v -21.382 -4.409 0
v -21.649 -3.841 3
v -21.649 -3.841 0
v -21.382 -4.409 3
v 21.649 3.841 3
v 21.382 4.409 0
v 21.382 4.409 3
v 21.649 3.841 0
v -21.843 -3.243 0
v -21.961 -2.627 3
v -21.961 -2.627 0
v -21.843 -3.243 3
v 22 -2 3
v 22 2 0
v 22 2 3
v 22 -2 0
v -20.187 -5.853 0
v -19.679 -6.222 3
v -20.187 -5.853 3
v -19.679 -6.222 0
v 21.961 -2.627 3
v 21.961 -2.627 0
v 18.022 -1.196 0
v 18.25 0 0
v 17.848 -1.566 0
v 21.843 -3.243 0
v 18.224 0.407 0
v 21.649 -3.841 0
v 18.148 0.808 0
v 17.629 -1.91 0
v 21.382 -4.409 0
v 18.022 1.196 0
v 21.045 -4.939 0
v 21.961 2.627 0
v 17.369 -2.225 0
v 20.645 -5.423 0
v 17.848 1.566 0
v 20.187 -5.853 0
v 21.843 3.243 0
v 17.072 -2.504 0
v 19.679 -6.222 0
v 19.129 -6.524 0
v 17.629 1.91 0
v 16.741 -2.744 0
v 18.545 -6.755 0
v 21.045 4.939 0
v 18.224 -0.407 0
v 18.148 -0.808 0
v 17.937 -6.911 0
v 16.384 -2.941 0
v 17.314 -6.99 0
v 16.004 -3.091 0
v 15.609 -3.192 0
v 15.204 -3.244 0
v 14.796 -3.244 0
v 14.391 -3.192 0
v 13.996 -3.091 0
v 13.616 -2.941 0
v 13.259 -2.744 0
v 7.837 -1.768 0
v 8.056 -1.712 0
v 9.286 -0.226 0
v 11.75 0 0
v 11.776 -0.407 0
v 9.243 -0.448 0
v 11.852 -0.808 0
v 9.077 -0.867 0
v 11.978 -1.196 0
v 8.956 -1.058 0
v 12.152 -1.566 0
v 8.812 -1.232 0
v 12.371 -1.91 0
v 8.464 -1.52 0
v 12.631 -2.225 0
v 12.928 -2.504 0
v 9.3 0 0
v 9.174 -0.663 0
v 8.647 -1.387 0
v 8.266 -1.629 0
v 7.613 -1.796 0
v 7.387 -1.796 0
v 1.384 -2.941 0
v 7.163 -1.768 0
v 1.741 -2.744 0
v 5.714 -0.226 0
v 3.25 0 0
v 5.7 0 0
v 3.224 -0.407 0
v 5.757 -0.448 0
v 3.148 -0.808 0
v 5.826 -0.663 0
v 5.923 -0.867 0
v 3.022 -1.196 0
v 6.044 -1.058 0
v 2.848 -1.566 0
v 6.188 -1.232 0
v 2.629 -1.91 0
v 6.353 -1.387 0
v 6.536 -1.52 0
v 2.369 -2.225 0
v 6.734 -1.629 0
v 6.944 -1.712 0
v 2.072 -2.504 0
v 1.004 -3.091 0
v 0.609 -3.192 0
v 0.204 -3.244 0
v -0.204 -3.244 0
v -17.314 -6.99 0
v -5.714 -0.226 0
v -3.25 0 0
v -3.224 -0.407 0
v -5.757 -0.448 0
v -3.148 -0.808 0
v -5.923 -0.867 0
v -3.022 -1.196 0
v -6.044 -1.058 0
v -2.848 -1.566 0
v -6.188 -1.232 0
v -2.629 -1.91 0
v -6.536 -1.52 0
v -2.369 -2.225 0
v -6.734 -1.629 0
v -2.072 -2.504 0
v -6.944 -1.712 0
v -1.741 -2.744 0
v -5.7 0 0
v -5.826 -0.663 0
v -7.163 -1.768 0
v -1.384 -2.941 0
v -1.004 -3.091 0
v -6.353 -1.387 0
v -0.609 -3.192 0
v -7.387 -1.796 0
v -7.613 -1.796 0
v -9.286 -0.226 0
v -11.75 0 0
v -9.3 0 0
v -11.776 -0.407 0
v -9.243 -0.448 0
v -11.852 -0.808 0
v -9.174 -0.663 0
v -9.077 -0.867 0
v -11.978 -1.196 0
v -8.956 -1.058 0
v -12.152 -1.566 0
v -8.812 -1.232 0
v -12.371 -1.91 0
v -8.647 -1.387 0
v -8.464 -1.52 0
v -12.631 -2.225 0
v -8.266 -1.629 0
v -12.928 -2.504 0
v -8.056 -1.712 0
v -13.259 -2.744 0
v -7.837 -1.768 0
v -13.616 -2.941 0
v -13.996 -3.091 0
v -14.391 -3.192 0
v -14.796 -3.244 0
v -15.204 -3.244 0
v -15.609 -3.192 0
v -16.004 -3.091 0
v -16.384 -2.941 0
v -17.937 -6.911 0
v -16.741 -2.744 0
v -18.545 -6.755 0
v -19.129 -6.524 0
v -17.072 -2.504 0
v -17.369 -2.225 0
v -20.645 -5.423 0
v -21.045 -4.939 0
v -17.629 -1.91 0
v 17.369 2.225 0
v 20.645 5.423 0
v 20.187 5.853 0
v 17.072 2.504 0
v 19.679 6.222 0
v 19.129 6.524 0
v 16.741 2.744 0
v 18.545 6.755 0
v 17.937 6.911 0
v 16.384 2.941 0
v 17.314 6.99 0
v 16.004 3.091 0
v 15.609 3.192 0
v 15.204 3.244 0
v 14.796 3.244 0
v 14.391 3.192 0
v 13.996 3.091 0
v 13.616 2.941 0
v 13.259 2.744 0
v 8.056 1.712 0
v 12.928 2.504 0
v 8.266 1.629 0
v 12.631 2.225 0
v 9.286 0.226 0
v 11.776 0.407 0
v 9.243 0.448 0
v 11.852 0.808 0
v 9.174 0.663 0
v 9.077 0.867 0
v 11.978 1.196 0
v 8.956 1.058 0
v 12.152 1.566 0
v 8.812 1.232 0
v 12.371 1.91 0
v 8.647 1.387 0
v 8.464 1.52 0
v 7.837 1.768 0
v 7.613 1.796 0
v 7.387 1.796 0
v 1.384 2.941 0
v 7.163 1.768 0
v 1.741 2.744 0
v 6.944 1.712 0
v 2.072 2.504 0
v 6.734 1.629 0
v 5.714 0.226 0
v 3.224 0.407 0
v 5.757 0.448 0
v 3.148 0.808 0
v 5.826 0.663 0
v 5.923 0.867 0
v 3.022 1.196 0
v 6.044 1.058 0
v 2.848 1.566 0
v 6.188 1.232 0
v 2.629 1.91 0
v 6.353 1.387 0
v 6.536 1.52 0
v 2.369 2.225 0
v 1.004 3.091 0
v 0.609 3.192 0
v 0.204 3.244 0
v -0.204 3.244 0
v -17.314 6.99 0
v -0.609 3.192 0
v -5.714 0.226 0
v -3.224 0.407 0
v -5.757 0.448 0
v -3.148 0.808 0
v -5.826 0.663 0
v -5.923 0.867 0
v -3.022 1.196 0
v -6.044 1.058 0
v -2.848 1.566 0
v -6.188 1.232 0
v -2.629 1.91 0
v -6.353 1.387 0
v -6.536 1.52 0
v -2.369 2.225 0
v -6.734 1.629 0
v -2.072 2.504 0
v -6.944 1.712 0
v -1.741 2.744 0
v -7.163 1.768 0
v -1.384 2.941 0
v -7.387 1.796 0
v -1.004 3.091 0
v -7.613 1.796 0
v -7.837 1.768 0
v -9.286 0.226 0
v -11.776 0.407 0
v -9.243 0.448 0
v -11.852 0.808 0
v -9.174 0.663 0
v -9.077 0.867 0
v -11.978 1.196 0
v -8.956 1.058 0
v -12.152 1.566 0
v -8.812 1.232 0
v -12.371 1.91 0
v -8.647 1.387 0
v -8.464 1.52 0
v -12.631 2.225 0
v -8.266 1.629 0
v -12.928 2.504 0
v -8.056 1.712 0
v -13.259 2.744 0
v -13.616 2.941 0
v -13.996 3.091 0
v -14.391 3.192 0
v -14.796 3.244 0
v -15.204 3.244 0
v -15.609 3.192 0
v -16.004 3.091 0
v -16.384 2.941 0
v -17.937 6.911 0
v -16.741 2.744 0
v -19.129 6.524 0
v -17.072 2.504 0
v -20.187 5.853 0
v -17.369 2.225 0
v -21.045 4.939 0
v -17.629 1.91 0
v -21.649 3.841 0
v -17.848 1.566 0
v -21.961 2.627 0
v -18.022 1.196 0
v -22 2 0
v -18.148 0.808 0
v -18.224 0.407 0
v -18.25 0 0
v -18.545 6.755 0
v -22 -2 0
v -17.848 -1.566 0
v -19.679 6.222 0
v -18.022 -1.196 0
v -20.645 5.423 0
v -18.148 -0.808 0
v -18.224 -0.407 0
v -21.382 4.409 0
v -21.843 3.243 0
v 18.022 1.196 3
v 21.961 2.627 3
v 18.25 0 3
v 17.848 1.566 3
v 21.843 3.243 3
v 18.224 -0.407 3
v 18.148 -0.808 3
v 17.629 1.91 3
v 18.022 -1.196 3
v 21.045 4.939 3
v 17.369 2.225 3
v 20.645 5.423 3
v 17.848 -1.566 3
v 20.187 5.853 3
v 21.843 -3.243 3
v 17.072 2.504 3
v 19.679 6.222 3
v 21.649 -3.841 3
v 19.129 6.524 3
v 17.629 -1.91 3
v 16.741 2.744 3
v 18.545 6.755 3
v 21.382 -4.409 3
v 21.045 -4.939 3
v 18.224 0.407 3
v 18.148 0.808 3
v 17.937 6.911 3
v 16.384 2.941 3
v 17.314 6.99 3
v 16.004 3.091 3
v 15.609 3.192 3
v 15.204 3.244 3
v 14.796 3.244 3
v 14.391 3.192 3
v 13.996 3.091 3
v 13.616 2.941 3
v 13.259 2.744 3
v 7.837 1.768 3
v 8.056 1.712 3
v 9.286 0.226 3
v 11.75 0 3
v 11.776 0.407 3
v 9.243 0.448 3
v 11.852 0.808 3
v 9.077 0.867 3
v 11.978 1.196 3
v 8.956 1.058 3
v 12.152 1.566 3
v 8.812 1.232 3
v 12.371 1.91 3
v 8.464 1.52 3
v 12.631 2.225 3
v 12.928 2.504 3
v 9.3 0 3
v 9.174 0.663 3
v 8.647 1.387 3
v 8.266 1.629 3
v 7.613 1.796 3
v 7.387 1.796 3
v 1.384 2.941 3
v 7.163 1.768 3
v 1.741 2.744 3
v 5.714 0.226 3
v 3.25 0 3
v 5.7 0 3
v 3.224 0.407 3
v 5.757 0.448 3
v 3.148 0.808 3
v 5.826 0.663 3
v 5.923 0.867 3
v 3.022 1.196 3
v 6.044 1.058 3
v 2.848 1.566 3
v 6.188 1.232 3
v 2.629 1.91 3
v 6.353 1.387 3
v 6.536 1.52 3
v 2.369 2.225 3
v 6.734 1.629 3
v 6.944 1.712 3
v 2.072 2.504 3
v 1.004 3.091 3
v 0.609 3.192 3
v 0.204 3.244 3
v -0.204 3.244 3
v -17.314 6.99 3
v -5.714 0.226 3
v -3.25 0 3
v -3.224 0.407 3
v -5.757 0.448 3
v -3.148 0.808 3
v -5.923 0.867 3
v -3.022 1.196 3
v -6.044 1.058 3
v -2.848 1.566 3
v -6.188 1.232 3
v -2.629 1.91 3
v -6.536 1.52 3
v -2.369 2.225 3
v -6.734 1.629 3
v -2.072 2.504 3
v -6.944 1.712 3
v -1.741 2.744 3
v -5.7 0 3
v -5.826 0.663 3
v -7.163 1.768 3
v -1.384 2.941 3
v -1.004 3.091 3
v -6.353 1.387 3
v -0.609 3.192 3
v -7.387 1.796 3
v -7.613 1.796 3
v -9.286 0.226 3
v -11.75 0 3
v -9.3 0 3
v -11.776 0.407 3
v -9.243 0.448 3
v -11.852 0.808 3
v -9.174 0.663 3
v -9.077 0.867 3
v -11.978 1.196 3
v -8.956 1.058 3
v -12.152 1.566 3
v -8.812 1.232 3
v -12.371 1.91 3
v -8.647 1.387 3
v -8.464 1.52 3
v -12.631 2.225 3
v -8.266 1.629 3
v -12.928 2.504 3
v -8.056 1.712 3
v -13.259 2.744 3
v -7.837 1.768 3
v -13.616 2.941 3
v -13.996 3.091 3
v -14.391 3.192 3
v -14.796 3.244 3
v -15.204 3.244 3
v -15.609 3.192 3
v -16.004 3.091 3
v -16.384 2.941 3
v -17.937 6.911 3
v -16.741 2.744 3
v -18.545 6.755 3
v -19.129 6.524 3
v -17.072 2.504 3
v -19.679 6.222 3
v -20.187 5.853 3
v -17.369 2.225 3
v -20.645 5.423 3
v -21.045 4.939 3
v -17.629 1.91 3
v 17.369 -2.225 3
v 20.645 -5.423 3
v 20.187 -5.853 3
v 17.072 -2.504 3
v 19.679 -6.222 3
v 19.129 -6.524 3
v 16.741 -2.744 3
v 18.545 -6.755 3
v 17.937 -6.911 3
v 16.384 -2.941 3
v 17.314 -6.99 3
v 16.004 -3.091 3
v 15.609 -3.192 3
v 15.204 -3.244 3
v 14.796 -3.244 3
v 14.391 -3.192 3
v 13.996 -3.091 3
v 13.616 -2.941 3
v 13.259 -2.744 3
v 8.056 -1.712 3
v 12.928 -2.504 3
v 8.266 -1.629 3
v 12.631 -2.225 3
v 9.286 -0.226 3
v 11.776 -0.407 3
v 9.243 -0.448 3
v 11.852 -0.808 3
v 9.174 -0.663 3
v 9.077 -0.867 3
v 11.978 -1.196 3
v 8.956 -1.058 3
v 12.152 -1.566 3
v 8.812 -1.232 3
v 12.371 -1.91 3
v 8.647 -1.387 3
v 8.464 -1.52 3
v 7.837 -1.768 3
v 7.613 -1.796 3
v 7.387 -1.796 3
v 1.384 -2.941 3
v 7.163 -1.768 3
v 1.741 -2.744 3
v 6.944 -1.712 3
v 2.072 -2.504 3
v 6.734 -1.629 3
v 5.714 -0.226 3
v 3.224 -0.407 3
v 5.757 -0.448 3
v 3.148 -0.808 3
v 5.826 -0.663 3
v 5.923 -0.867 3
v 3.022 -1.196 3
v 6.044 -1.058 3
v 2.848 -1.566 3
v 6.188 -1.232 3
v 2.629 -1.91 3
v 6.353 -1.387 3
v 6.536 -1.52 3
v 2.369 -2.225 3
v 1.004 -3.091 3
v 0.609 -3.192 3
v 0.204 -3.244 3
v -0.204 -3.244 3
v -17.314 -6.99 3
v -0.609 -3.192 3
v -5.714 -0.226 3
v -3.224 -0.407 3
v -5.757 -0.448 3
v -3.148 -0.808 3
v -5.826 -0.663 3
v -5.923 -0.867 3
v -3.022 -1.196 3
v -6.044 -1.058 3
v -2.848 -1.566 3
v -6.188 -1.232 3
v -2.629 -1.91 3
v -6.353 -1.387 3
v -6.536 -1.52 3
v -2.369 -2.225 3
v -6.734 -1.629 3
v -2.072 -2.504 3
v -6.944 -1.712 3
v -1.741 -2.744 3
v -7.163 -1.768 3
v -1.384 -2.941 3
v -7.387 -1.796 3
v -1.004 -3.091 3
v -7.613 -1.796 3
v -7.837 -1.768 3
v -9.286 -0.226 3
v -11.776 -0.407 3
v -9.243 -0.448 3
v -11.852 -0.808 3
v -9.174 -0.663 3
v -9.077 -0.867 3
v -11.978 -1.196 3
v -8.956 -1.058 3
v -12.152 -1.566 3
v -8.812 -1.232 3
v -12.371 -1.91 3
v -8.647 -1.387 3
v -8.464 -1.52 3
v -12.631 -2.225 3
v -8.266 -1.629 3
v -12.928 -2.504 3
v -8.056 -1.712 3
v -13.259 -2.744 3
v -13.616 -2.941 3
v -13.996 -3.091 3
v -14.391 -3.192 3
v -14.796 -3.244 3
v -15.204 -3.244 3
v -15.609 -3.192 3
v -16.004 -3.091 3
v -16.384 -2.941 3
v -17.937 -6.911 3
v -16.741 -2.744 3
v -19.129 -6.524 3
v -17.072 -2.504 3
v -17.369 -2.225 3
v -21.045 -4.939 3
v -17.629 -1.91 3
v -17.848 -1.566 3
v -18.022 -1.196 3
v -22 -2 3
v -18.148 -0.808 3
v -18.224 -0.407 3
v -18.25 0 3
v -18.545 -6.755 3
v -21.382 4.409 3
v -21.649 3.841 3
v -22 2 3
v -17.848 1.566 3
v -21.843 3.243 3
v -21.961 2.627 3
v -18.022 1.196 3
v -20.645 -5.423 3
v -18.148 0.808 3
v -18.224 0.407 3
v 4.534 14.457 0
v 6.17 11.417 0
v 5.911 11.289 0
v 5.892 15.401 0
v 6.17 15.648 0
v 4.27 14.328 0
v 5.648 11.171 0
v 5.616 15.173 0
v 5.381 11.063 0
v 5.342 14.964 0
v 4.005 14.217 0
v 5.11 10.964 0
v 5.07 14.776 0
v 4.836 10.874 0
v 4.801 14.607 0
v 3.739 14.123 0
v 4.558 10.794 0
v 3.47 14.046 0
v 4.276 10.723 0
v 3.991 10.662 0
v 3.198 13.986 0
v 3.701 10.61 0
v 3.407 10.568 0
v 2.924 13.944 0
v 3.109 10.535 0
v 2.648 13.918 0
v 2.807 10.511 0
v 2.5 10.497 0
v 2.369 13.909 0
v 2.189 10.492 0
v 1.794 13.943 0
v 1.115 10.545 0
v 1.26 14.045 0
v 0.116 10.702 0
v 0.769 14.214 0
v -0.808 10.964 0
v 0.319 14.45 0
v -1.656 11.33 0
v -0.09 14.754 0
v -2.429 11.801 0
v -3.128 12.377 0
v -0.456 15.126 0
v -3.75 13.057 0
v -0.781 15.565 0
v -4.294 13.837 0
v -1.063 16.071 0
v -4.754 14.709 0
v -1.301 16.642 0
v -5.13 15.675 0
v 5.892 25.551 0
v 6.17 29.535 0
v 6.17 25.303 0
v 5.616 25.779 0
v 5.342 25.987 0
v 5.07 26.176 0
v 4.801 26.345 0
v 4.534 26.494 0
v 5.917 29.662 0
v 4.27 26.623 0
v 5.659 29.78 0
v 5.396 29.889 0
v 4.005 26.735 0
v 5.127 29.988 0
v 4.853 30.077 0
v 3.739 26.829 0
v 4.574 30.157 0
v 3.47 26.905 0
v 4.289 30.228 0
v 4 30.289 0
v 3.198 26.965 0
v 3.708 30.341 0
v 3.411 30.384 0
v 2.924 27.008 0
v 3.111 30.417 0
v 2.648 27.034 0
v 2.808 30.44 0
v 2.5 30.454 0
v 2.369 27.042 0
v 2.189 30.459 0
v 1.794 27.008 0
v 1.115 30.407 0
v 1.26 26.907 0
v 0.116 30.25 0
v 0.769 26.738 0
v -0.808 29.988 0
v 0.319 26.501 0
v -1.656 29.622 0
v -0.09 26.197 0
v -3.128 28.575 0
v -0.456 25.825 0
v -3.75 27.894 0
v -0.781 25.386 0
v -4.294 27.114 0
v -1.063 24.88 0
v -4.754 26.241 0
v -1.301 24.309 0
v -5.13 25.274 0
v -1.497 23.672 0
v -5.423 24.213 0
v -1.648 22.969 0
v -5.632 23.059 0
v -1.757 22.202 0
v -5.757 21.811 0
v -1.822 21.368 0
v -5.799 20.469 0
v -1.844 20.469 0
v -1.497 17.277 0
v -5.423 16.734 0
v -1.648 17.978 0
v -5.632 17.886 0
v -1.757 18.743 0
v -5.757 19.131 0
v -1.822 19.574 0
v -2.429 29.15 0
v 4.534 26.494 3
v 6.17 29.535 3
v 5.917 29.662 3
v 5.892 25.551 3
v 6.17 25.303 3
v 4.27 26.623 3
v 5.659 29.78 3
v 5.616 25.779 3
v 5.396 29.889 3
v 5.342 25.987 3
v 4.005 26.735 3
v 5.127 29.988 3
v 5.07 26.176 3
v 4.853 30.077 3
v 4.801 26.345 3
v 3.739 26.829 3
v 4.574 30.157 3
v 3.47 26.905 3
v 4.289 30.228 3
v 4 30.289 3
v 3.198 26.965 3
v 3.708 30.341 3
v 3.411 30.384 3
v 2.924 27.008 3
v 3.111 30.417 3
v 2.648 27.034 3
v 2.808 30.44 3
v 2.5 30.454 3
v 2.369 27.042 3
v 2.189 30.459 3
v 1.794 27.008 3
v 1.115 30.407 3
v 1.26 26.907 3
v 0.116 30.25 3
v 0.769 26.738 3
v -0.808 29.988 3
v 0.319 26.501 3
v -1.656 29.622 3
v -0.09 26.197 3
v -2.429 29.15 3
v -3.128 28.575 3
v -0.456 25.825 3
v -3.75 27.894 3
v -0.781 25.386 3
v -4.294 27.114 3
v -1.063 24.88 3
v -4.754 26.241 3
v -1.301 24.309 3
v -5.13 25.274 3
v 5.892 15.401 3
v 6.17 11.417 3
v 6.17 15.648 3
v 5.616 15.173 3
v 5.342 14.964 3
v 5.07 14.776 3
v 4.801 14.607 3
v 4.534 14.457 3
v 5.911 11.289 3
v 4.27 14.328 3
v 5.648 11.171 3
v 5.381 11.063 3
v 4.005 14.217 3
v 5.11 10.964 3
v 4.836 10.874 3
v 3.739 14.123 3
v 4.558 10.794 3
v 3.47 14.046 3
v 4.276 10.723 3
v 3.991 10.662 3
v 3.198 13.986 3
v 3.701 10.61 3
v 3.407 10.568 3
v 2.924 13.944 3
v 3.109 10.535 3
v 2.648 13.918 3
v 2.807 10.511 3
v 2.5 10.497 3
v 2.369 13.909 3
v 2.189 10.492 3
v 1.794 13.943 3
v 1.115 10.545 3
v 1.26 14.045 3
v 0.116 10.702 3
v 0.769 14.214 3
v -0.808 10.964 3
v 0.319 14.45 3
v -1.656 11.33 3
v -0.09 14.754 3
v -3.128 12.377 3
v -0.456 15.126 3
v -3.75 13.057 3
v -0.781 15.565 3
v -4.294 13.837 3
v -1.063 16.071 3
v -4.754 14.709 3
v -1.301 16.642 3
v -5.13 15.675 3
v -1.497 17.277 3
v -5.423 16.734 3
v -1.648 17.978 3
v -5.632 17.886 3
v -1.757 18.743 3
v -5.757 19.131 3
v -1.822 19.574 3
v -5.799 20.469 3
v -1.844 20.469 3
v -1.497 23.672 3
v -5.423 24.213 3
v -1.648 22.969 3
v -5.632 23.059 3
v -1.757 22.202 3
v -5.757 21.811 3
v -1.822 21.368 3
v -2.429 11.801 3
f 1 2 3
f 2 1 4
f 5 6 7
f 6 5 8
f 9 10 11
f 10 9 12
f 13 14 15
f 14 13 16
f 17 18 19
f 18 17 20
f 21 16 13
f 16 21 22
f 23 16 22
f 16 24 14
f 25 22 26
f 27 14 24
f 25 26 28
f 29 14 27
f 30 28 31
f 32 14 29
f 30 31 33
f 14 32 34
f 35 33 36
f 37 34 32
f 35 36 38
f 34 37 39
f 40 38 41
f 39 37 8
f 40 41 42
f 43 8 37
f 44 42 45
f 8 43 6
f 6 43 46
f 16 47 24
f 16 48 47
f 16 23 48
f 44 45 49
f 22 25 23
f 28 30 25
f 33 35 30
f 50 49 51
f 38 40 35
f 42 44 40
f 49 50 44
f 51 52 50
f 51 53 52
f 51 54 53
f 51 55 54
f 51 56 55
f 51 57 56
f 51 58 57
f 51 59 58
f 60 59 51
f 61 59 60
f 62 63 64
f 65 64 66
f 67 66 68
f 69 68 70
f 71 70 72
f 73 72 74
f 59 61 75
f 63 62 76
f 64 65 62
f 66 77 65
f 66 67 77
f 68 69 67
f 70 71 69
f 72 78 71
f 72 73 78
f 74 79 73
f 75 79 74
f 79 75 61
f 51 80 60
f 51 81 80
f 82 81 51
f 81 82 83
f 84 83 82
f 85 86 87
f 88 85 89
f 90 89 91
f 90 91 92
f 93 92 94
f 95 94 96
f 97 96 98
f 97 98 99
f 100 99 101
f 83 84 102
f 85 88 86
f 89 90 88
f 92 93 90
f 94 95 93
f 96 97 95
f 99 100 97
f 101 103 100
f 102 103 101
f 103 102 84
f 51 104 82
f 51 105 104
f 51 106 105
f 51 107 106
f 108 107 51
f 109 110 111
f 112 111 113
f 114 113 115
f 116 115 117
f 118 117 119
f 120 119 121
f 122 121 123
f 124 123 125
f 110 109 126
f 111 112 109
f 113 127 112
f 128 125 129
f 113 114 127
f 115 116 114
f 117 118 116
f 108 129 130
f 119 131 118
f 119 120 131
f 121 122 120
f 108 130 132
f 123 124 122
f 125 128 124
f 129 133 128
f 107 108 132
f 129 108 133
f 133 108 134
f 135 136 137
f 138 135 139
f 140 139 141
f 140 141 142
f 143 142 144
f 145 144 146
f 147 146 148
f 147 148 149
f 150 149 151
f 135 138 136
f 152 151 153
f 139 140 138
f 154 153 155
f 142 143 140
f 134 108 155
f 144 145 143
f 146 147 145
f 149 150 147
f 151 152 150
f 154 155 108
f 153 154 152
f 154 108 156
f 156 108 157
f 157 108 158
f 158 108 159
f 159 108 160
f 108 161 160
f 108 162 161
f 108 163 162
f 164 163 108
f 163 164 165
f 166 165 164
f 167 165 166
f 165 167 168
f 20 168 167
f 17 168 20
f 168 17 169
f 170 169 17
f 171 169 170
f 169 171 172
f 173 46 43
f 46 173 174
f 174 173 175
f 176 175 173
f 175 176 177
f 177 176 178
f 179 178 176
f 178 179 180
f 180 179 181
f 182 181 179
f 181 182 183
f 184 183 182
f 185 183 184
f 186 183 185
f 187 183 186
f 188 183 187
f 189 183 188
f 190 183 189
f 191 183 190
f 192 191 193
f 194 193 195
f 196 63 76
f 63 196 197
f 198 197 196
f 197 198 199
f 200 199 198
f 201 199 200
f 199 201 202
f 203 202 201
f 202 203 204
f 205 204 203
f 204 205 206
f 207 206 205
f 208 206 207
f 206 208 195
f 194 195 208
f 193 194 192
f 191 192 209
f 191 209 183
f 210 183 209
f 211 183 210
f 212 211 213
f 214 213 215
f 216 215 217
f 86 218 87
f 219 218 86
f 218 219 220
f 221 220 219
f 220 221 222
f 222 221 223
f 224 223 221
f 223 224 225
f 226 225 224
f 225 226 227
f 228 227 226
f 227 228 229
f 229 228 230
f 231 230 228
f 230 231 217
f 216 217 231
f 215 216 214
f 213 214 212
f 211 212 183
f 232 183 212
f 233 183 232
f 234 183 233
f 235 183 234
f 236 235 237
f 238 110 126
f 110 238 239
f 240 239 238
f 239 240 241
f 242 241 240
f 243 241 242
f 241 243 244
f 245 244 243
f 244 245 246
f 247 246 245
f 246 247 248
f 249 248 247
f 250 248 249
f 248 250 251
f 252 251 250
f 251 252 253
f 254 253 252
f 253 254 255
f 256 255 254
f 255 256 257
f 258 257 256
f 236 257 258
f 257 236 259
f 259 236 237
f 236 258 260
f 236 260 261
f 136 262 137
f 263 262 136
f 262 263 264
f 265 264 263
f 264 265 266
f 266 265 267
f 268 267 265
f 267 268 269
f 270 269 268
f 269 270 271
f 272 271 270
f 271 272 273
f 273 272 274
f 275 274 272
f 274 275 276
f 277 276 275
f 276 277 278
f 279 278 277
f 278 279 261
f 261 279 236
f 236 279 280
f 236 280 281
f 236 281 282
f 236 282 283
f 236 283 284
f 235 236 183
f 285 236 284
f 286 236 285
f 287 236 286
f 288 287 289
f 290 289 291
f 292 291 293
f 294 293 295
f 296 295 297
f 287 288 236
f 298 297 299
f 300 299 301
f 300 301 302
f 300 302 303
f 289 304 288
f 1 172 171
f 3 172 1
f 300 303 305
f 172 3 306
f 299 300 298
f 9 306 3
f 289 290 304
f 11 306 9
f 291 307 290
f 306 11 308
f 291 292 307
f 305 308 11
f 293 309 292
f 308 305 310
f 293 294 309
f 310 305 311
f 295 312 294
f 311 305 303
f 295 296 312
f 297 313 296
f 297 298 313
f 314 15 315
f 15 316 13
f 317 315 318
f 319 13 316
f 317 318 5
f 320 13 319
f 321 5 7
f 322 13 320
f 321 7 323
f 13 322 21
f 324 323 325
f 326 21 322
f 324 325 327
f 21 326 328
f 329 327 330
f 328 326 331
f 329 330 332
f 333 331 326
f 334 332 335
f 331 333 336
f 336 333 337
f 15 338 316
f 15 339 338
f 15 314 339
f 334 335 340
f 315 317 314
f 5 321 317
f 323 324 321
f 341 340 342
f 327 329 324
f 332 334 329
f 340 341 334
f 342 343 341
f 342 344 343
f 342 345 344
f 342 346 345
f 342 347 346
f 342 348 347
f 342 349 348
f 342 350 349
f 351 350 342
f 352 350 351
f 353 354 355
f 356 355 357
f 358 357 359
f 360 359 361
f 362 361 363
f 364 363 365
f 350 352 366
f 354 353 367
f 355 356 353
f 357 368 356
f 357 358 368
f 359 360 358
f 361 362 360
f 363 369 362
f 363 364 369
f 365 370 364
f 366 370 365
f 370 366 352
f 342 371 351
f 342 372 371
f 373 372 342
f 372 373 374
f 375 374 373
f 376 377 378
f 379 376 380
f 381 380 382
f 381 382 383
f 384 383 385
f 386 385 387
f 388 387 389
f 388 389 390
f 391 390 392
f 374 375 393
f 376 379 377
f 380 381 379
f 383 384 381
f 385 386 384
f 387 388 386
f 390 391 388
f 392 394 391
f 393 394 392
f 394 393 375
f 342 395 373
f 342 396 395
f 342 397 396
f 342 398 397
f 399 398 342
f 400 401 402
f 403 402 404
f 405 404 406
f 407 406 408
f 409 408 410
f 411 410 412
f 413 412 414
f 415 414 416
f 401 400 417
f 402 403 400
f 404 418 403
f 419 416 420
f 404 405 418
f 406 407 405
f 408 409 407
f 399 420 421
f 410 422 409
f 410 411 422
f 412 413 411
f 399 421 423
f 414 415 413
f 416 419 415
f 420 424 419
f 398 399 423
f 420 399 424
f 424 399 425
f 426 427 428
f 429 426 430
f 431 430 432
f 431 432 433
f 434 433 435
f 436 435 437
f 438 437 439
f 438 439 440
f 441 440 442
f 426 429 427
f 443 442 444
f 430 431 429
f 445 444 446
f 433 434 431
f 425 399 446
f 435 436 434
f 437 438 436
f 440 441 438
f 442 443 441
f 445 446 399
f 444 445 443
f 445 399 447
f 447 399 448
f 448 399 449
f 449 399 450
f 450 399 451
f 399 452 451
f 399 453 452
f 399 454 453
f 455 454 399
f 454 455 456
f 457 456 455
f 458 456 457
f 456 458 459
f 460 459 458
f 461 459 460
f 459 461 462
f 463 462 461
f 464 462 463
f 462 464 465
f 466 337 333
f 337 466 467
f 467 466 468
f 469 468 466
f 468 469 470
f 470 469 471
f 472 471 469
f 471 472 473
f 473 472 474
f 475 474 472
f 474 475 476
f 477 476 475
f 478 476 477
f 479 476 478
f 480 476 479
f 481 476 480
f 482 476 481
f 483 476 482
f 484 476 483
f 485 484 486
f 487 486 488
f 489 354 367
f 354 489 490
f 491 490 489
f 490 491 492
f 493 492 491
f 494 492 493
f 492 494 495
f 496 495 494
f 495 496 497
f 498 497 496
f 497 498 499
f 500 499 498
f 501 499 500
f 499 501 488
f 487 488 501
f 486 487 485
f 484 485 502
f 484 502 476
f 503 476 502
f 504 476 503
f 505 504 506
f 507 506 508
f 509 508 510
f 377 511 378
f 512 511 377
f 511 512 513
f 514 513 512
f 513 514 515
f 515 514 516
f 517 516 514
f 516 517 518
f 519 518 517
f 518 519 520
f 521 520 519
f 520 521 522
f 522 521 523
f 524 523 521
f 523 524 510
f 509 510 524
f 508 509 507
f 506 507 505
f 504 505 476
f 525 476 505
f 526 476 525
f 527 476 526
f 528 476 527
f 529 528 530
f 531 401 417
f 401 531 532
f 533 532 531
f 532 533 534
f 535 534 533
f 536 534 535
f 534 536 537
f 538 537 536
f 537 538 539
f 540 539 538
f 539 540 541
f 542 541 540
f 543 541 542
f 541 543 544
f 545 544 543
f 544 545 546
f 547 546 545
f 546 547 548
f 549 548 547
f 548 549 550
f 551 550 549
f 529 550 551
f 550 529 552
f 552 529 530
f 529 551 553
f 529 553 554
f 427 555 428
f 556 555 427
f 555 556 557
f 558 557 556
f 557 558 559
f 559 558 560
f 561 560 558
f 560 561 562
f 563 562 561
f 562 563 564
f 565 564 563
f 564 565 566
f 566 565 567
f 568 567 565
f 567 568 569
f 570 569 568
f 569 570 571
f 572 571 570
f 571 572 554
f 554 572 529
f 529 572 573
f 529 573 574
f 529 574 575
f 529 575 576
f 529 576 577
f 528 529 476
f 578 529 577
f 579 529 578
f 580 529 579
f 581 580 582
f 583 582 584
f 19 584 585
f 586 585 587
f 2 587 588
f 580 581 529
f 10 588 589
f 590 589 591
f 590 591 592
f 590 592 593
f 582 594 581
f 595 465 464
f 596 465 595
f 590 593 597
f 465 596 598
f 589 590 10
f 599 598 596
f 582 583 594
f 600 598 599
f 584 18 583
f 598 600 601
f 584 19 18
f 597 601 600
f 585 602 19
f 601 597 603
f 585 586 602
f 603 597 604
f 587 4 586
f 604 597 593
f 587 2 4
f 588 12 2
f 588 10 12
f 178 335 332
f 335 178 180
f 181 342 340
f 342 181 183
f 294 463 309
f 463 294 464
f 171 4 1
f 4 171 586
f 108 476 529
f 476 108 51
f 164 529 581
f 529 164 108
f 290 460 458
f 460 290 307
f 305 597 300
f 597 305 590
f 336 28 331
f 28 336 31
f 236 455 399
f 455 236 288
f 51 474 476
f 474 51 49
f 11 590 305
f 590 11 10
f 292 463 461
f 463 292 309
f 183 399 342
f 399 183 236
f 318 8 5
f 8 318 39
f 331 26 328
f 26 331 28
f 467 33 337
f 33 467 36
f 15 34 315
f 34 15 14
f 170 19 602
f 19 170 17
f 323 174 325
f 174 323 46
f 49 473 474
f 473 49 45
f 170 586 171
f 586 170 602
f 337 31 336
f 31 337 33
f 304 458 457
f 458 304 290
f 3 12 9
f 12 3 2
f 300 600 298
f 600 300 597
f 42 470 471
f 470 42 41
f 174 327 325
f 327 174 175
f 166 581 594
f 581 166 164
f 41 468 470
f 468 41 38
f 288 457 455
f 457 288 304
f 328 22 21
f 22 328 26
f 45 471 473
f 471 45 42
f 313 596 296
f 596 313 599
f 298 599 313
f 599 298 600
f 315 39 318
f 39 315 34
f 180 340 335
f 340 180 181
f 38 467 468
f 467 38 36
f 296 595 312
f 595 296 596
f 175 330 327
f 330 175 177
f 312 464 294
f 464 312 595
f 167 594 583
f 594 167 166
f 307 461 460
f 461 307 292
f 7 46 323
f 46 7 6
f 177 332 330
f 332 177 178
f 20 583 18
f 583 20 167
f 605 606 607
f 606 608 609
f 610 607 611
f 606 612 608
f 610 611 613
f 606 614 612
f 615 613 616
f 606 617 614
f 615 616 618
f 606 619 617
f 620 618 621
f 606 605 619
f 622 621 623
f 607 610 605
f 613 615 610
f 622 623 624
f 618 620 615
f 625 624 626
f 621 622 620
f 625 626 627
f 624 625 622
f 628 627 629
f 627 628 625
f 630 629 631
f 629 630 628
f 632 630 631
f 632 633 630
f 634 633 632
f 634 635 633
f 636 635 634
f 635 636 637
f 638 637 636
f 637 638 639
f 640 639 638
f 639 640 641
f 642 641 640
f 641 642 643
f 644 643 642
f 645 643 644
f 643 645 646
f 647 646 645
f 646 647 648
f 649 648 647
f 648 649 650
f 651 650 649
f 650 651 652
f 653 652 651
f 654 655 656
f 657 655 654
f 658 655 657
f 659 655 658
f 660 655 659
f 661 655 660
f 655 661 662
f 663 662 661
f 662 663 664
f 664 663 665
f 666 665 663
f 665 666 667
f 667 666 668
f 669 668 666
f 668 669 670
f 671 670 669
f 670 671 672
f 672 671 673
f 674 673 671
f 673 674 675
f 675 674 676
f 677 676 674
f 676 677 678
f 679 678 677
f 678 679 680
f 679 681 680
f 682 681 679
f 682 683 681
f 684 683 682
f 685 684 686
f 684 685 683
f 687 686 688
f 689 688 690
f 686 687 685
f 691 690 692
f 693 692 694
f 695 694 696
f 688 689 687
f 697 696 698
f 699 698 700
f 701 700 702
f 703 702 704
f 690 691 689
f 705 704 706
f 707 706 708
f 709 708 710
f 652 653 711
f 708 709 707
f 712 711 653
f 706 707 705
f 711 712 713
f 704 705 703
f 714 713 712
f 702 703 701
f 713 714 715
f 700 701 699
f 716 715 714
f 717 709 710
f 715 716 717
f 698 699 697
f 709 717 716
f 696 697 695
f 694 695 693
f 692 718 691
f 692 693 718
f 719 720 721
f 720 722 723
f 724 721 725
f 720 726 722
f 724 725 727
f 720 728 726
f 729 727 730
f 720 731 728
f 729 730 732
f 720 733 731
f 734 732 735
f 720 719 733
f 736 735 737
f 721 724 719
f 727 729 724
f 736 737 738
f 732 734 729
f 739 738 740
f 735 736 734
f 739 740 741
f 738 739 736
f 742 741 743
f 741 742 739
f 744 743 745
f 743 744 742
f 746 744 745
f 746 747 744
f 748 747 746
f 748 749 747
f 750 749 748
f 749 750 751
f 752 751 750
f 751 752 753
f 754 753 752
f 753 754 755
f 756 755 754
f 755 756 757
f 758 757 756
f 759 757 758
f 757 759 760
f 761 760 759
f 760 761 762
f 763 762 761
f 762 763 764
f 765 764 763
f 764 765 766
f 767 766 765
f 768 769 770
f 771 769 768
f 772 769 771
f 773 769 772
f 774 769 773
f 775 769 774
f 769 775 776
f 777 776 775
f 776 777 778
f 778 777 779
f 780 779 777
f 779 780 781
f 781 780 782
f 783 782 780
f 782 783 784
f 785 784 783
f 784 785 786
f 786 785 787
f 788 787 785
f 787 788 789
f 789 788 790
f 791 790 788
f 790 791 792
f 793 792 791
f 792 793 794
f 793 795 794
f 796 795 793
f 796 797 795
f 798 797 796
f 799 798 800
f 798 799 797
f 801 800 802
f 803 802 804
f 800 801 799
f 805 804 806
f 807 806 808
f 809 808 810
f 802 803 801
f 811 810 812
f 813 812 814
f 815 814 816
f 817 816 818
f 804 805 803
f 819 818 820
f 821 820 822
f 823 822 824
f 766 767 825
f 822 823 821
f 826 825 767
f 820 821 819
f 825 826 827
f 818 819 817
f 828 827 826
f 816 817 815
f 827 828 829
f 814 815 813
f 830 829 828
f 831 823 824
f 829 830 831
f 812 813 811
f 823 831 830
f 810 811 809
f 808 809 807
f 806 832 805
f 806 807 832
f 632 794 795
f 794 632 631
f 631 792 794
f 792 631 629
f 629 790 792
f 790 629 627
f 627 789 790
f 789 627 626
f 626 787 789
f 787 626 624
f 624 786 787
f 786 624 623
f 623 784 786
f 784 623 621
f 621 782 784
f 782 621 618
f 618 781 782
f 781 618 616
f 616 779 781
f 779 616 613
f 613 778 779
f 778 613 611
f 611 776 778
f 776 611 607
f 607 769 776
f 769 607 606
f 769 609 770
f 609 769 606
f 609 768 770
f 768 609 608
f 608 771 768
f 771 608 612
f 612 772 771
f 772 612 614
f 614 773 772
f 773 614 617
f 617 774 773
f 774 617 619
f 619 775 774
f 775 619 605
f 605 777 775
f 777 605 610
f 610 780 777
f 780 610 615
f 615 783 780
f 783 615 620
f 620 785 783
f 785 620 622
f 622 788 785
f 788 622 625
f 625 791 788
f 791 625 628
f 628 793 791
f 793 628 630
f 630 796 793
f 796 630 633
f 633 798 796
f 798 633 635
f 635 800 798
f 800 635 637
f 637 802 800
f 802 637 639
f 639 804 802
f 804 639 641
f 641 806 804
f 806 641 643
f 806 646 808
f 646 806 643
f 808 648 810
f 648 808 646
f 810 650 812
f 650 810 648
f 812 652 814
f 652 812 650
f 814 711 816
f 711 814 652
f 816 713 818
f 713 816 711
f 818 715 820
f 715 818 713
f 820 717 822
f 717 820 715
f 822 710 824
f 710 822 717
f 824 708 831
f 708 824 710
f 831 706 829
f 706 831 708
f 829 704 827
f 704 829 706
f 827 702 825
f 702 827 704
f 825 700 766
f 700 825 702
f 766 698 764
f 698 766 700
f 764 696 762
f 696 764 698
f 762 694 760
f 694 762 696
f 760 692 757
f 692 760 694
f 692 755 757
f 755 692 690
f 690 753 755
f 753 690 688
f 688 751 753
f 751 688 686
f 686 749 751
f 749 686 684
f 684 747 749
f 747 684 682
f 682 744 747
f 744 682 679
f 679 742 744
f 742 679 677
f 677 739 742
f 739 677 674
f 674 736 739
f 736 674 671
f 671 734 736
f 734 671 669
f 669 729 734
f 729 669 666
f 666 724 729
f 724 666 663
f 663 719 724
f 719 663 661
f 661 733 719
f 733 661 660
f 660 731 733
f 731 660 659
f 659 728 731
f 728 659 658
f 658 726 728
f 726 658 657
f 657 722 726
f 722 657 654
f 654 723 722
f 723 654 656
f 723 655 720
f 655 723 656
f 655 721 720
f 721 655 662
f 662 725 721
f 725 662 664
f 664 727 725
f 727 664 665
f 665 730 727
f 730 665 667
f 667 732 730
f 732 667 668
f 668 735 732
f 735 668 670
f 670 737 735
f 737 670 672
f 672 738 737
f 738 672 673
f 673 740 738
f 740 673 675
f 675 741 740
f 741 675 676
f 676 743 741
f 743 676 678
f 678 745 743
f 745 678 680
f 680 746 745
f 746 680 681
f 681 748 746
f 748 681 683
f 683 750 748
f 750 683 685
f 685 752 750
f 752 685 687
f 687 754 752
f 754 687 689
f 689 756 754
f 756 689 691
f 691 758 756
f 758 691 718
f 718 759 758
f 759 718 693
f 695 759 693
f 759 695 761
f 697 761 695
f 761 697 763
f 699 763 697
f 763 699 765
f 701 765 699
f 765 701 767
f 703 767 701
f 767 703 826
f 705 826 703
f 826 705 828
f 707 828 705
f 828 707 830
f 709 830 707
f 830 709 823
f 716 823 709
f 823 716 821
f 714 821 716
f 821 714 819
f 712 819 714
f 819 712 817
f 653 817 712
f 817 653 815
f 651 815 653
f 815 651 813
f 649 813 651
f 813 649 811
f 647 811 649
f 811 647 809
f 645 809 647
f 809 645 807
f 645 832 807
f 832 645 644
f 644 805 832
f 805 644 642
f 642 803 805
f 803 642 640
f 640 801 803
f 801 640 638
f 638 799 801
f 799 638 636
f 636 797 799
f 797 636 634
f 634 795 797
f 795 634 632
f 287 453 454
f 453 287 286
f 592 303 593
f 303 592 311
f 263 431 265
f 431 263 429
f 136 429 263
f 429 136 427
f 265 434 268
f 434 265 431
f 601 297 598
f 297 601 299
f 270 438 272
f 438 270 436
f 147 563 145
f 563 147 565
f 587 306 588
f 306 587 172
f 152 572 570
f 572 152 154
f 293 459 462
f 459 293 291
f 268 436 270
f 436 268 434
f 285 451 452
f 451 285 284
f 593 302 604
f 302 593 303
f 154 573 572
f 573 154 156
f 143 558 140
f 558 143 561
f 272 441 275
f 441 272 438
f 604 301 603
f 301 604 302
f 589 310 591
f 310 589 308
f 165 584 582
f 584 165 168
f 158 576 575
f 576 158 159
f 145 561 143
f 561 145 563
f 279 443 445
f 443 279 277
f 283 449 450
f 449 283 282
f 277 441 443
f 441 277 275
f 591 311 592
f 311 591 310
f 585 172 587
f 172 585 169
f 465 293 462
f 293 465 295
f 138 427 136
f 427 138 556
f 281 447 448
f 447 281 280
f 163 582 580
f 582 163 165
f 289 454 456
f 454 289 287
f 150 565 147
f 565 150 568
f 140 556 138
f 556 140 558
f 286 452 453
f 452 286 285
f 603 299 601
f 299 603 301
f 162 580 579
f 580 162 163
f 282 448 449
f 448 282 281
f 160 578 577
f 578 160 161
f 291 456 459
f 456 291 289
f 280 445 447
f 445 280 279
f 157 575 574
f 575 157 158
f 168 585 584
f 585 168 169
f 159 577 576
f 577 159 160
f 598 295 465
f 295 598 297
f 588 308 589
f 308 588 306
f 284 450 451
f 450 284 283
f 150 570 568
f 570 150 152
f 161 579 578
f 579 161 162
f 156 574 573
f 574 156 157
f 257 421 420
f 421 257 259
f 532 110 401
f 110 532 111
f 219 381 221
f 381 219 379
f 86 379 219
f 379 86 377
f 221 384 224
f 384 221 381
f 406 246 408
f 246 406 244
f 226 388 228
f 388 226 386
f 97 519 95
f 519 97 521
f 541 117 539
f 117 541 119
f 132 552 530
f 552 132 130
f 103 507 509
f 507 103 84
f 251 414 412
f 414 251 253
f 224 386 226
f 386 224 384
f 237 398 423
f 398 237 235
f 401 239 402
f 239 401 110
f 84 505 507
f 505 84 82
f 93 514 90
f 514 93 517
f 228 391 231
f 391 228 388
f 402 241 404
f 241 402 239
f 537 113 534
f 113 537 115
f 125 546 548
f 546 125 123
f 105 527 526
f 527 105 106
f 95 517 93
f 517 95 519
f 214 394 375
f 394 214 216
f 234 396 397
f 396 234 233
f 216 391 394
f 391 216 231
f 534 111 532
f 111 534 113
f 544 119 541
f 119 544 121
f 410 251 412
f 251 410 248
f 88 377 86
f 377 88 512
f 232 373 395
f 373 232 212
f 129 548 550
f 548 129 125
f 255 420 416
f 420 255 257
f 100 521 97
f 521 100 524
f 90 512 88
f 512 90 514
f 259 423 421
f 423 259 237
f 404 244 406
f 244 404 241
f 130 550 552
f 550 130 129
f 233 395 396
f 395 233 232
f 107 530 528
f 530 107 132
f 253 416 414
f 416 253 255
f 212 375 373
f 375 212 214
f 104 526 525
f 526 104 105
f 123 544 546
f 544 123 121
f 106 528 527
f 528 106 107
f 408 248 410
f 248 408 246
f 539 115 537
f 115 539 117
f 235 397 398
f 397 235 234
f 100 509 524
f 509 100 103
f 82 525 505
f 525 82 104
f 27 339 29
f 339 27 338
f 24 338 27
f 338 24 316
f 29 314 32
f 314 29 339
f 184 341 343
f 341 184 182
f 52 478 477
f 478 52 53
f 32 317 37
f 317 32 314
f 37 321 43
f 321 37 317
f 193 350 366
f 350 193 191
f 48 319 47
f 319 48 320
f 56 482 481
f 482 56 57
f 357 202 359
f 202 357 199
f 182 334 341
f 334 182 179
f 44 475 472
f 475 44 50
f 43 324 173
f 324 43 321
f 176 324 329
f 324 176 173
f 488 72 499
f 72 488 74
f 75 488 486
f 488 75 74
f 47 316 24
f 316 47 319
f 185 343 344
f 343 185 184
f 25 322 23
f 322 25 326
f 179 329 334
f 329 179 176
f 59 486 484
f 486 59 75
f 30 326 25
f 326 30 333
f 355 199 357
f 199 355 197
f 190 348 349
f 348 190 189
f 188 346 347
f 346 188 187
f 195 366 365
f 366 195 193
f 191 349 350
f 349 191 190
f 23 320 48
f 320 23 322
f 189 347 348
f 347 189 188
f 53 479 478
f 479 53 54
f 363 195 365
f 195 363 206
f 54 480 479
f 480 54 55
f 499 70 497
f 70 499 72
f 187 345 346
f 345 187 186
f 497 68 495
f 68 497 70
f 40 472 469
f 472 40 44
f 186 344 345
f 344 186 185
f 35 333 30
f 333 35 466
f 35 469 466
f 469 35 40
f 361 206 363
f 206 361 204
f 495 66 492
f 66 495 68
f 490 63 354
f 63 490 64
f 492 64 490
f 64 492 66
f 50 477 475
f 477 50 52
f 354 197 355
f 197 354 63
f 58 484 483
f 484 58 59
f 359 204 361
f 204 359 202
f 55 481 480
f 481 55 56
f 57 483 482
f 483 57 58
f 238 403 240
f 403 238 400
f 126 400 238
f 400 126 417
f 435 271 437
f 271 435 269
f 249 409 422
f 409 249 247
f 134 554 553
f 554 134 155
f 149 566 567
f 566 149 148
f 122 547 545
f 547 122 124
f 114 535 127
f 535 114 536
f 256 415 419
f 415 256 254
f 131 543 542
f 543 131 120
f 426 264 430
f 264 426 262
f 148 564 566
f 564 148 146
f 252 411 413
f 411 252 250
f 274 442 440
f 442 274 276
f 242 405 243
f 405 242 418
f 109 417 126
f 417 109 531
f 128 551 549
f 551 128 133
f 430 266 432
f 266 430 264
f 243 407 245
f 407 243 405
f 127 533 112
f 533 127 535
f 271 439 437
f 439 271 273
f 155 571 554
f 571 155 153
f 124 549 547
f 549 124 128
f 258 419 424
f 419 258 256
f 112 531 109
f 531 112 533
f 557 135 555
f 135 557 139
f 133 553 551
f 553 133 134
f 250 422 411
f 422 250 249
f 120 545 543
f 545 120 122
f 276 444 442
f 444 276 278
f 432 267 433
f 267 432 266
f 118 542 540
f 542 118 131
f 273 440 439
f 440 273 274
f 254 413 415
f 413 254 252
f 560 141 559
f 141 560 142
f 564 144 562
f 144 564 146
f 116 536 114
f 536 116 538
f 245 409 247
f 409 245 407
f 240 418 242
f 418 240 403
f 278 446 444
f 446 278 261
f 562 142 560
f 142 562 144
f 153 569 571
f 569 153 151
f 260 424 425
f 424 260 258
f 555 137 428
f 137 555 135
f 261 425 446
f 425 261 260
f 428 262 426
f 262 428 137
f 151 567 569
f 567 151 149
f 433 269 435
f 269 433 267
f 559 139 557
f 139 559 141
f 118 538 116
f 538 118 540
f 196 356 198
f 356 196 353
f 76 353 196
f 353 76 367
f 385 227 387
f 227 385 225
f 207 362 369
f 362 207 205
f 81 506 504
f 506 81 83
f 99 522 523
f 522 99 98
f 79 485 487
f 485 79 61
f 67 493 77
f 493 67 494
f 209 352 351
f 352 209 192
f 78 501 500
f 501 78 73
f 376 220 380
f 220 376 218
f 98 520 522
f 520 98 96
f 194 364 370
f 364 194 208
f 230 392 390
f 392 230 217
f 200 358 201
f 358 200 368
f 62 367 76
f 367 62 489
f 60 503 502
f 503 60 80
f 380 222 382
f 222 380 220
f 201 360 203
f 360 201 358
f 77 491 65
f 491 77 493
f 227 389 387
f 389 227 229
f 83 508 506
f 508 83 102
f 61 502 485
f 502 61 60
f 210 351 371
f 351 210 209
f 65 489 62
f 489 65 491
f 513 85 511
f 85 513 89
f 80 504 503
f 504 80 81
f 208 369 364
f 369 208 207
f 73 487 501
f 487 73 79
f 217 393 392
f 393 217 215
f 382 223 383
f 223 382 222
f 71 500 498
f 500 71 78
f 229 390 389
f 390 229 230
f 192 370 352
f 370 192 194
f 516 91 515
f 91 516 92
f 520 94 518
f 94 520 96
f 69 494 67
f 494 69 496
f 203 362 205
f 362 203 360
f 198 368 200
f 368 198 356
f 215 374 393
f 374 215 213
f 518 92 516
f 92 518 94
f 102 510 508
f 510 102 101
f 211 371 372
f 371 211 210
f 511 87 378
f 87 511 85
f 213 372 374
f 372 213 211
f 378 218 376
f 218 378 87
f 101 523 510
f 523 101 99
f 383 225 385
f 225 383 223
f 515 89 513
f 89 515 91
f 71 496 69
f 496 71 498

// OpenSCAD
$fn = 50;


difference() {
	union() {
		hull() {
			translate(v = [-17.0000000000, 2.0000000000, 0]) {
				cylinder(h = 3, r = 5);
			}
			translate(v = [17.0000000000, 2.0000000000, 0]) {
				cylinder(h = 3, r = 5);
			}
			translate(v = [-17.0000000000, -2.0000000000, 0]) {
				cylinder(h = 3, r = 5);
			}
			translate(v = [17.0000000000, -2.0000000000, 0]) {
				cylinder(h = 3, r = 5);
			}
		}
		translate(v = [0, 30.0000000000, 0]) {
			linear_extrude(height = 3) {
				text(font = "DejaVu Sans Mono:style=Bold", halign = "center", size = 19.0000000000, text = "C", valign = "top");
			}
		}
	}
	union() {
		translate(v = [-15.0000000000, 0.0000000000, 0]) {
			translate(v = [0, 0, -100]) {
				cylinder(h = 200, r = 3.2500000000);
			}
		}
		translate(v = [0, 0, -100]) {
			cylinder(h = 200, r = 3.2500000000);
		}
		translate(v = [15.0000000000, 0.0000000000, 0]) {
			translate(v = [0, 0, -100]) {
				cylinder(h = 200, r = 3.2500000000);
			}
		}
		translate(v = [-15.0000000000, 0.0000000000, 0]) {
			translate(v = [0, 0, -100]) {
				cylinder(h = 200, r = 1.8000000000);
			}
		}
		translate(v = [-7.5000000000, 0.0000000000, 0]) {
			translate(v = [0, 0, -100]) {
				cylinder(h = 200, r = 1.8000000000);
			}
		}
		translate(v = [0, 0, -100]) {
			cylinder(h = 200, r = 1.8000000000);
		}
		translate(v = [7.5000000000, 0.0000000000, 0]) {
			translate(v = [0, 0, -100]) {
				cylinder(h = 200, r = 1.8000000000);
			}
		}
		translate(v = [15.0000000000, 0.0000000000, 0]) {
			translate(v = [0, 0, -100]) {
				cylinder(h = 200, r = 1.8000000000);
			}
		}
	}
}
